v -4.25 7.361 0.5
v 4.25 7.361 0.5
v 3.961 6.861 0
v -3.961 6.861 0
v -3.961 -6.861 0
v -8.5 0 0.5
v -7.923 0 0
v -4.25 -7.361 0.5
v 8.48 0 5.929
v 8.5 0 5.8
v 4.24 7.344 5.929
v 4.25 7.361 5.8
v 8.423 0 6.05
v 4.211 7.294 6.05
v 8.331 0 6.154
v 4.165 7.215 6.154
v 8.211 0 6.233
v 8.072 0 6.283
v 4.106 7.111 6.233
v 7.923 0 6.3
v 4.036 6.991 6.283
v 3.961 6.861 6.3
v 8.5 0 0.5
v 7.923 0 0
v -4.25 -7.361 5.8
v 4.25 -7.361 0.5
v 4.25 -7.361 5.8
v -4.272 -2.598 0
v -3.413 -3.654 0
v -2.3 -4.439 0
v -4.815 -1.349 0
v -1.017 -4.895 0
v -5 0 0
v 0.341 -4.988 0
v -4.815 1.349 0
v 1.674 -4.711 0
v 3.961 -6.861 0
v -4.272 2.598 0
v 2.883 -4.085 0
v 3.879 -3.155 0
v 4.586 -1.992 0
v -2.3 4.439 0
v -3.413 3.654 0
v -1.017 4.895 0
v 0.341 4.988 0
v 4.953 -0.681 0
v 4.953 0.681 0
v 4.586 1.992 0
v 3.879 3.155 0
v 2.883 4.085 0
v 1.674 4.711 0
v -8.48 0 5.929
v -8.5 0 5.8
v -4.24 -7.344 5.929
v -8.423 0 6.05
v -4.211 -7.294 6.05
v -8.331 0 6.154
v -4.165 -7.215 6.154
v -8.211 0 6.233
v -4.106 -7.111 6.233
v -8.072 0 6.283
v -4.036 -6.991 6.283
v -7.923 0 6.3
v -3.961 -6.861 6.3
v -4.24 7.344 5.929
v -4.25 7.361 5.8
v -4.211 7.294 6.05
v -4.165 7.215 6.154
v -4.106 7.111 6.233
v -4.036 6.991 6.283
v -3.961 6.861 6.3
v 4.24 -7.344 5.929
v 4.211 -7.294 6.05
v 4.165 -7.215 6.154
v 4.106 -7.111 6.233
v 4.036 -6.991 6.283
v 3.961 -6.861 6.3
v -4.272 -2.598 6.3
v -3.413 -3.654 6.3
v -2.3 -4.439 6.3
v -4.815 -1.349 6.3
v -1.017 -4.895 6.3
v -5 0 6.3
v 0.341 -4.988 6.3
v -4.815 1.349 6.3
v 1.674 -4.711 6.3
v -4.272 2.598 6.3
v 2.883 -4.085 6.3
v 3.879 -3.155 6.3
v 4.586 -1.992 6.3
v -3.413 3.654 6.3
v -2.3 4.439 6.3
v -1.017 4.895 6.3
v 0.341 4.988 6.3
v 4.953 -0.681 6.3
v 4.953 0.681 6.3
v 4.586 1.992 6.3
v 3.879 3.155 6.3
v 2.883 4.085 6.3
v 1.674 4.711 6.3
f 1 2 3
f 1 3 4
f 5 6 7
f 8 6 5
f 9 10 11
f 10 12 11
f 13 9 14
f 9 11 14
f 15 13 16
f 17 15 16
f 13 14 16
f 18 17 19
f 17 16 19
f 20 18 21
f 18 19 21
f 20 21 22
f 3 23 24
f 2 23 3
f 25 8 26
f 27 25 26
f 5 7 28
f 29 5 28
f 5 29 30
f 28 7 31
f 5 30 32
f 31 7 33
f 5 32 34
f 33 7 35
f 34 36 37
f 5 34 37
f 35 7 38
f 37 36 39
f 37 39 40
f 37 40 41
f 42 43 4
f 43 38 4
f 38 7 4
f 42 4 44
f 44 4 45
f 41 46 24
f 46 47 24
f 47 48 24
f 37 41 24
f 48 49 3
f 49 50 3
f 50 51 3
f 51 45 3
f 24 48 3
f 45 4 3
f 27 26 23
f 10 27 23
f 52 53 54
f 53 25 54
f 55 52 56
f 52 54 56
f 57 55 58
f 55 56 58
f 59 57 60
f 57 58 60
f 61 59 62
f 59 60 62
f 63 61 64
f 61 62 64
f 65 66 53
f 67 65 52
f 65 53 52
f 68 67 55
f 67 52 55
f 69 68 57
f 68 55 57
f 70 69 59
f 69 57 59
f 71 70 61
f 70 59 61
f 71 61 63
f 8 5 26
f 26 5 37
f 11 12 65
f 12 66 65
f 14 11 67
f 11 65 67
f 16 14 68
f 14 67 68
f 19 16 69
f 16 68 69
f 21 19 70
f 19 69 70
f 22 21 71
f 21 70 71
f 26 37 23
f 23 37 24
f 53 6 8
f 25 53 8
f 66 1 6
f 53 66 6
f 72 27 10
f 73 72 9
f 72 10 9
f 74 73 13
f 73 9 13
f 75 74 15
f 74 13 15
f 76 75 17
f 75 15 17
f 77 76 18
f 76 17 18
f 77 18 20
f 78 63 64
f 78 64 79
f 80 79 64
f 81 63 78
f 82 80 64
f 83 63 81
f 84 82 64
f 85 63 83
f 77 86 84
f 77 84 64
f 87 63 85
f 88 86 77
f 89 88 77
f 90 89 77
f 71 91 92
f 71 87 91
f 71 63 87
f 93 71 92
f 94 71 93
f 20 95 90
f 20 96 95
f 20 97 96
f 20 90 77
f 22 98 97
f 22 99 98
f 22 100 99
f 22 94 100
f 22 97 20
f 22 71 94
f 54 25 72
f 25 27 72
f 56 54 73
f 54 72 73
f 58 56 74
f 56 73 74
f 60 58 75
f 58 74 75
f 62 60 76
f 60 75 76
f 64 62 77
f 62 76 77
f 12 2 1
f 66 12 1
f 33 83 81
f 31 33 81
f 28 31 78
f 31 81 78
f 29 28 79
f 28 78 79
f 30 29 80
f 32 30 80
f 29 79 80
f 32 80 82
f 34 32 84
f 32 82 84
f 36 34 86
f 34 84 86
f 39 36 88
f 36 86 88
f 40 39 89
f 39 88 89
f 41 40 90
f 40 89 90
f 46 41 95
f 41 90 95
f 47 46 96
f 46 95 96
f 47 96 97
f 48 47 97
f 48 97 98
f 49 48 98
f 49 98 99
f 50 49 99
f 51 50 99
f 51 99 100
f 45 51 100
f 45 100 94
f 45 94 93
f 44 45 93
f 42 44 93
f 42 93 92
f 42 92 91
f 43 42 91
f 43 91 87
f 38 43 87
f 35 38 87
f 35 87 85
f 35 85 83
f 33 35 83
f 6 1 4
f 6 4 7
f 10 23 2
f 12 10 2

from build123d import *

# Parameters (mm, degrees)
F1_DEPTH = 6.3
F3_R     = 0.5
F4_D     = 10
F5_SIZE  = 0.5


with BuildPart() as f1:
    # F0 (on Top) → F1 (new body)
    with BuildSketch(Plane.XY):
        Polygon((4.25, -7.361216), (8.5, 0), (4.25, 7.361216), (-4.25, 7.361216), (-8.5, 0), (-4.25, -7.361216), align=None)
    extrude(amount=F1_DEPTH)

    # F3
    f3_edges = [f1.edges().sort_by_distance(p)[0] for p in [
        (0, -7.361216, 6.3),
        (6.375, -3.680608, 6.3),
        (6.375, 3.680608, 6.3),
        (0, 7.361216, 6.3),
        (-6.375, 3.680608, 6.3),
        (-6.375, -3.680608, 6.3),
    ]]
    fillet(f3_edges, radius=F3_R)

    # F4 (through all)
    with Locations(Plane(origin=(0, 0, 0), x_dir=(1, 0, 0), z_dir=(0, 0, -1))):
        with Locations((0, 0)):
            Hole(F4_D / 2)

    # F5
    f5_edges = [f1.edges().sort_by_distance(p)[0] for p in [
        (-6.375, 3.680608, 0),
        (0, 7.361216, 0),
        (-6.375, -3.680608, 0),
        (0, -7.361216, 0),
        (6.375, -3.680608, 0),
        (6.375, 3.680608, 0),
    ]]
    chamfer(f5_edges, length=F5_SIZE)


solid = f1.part
